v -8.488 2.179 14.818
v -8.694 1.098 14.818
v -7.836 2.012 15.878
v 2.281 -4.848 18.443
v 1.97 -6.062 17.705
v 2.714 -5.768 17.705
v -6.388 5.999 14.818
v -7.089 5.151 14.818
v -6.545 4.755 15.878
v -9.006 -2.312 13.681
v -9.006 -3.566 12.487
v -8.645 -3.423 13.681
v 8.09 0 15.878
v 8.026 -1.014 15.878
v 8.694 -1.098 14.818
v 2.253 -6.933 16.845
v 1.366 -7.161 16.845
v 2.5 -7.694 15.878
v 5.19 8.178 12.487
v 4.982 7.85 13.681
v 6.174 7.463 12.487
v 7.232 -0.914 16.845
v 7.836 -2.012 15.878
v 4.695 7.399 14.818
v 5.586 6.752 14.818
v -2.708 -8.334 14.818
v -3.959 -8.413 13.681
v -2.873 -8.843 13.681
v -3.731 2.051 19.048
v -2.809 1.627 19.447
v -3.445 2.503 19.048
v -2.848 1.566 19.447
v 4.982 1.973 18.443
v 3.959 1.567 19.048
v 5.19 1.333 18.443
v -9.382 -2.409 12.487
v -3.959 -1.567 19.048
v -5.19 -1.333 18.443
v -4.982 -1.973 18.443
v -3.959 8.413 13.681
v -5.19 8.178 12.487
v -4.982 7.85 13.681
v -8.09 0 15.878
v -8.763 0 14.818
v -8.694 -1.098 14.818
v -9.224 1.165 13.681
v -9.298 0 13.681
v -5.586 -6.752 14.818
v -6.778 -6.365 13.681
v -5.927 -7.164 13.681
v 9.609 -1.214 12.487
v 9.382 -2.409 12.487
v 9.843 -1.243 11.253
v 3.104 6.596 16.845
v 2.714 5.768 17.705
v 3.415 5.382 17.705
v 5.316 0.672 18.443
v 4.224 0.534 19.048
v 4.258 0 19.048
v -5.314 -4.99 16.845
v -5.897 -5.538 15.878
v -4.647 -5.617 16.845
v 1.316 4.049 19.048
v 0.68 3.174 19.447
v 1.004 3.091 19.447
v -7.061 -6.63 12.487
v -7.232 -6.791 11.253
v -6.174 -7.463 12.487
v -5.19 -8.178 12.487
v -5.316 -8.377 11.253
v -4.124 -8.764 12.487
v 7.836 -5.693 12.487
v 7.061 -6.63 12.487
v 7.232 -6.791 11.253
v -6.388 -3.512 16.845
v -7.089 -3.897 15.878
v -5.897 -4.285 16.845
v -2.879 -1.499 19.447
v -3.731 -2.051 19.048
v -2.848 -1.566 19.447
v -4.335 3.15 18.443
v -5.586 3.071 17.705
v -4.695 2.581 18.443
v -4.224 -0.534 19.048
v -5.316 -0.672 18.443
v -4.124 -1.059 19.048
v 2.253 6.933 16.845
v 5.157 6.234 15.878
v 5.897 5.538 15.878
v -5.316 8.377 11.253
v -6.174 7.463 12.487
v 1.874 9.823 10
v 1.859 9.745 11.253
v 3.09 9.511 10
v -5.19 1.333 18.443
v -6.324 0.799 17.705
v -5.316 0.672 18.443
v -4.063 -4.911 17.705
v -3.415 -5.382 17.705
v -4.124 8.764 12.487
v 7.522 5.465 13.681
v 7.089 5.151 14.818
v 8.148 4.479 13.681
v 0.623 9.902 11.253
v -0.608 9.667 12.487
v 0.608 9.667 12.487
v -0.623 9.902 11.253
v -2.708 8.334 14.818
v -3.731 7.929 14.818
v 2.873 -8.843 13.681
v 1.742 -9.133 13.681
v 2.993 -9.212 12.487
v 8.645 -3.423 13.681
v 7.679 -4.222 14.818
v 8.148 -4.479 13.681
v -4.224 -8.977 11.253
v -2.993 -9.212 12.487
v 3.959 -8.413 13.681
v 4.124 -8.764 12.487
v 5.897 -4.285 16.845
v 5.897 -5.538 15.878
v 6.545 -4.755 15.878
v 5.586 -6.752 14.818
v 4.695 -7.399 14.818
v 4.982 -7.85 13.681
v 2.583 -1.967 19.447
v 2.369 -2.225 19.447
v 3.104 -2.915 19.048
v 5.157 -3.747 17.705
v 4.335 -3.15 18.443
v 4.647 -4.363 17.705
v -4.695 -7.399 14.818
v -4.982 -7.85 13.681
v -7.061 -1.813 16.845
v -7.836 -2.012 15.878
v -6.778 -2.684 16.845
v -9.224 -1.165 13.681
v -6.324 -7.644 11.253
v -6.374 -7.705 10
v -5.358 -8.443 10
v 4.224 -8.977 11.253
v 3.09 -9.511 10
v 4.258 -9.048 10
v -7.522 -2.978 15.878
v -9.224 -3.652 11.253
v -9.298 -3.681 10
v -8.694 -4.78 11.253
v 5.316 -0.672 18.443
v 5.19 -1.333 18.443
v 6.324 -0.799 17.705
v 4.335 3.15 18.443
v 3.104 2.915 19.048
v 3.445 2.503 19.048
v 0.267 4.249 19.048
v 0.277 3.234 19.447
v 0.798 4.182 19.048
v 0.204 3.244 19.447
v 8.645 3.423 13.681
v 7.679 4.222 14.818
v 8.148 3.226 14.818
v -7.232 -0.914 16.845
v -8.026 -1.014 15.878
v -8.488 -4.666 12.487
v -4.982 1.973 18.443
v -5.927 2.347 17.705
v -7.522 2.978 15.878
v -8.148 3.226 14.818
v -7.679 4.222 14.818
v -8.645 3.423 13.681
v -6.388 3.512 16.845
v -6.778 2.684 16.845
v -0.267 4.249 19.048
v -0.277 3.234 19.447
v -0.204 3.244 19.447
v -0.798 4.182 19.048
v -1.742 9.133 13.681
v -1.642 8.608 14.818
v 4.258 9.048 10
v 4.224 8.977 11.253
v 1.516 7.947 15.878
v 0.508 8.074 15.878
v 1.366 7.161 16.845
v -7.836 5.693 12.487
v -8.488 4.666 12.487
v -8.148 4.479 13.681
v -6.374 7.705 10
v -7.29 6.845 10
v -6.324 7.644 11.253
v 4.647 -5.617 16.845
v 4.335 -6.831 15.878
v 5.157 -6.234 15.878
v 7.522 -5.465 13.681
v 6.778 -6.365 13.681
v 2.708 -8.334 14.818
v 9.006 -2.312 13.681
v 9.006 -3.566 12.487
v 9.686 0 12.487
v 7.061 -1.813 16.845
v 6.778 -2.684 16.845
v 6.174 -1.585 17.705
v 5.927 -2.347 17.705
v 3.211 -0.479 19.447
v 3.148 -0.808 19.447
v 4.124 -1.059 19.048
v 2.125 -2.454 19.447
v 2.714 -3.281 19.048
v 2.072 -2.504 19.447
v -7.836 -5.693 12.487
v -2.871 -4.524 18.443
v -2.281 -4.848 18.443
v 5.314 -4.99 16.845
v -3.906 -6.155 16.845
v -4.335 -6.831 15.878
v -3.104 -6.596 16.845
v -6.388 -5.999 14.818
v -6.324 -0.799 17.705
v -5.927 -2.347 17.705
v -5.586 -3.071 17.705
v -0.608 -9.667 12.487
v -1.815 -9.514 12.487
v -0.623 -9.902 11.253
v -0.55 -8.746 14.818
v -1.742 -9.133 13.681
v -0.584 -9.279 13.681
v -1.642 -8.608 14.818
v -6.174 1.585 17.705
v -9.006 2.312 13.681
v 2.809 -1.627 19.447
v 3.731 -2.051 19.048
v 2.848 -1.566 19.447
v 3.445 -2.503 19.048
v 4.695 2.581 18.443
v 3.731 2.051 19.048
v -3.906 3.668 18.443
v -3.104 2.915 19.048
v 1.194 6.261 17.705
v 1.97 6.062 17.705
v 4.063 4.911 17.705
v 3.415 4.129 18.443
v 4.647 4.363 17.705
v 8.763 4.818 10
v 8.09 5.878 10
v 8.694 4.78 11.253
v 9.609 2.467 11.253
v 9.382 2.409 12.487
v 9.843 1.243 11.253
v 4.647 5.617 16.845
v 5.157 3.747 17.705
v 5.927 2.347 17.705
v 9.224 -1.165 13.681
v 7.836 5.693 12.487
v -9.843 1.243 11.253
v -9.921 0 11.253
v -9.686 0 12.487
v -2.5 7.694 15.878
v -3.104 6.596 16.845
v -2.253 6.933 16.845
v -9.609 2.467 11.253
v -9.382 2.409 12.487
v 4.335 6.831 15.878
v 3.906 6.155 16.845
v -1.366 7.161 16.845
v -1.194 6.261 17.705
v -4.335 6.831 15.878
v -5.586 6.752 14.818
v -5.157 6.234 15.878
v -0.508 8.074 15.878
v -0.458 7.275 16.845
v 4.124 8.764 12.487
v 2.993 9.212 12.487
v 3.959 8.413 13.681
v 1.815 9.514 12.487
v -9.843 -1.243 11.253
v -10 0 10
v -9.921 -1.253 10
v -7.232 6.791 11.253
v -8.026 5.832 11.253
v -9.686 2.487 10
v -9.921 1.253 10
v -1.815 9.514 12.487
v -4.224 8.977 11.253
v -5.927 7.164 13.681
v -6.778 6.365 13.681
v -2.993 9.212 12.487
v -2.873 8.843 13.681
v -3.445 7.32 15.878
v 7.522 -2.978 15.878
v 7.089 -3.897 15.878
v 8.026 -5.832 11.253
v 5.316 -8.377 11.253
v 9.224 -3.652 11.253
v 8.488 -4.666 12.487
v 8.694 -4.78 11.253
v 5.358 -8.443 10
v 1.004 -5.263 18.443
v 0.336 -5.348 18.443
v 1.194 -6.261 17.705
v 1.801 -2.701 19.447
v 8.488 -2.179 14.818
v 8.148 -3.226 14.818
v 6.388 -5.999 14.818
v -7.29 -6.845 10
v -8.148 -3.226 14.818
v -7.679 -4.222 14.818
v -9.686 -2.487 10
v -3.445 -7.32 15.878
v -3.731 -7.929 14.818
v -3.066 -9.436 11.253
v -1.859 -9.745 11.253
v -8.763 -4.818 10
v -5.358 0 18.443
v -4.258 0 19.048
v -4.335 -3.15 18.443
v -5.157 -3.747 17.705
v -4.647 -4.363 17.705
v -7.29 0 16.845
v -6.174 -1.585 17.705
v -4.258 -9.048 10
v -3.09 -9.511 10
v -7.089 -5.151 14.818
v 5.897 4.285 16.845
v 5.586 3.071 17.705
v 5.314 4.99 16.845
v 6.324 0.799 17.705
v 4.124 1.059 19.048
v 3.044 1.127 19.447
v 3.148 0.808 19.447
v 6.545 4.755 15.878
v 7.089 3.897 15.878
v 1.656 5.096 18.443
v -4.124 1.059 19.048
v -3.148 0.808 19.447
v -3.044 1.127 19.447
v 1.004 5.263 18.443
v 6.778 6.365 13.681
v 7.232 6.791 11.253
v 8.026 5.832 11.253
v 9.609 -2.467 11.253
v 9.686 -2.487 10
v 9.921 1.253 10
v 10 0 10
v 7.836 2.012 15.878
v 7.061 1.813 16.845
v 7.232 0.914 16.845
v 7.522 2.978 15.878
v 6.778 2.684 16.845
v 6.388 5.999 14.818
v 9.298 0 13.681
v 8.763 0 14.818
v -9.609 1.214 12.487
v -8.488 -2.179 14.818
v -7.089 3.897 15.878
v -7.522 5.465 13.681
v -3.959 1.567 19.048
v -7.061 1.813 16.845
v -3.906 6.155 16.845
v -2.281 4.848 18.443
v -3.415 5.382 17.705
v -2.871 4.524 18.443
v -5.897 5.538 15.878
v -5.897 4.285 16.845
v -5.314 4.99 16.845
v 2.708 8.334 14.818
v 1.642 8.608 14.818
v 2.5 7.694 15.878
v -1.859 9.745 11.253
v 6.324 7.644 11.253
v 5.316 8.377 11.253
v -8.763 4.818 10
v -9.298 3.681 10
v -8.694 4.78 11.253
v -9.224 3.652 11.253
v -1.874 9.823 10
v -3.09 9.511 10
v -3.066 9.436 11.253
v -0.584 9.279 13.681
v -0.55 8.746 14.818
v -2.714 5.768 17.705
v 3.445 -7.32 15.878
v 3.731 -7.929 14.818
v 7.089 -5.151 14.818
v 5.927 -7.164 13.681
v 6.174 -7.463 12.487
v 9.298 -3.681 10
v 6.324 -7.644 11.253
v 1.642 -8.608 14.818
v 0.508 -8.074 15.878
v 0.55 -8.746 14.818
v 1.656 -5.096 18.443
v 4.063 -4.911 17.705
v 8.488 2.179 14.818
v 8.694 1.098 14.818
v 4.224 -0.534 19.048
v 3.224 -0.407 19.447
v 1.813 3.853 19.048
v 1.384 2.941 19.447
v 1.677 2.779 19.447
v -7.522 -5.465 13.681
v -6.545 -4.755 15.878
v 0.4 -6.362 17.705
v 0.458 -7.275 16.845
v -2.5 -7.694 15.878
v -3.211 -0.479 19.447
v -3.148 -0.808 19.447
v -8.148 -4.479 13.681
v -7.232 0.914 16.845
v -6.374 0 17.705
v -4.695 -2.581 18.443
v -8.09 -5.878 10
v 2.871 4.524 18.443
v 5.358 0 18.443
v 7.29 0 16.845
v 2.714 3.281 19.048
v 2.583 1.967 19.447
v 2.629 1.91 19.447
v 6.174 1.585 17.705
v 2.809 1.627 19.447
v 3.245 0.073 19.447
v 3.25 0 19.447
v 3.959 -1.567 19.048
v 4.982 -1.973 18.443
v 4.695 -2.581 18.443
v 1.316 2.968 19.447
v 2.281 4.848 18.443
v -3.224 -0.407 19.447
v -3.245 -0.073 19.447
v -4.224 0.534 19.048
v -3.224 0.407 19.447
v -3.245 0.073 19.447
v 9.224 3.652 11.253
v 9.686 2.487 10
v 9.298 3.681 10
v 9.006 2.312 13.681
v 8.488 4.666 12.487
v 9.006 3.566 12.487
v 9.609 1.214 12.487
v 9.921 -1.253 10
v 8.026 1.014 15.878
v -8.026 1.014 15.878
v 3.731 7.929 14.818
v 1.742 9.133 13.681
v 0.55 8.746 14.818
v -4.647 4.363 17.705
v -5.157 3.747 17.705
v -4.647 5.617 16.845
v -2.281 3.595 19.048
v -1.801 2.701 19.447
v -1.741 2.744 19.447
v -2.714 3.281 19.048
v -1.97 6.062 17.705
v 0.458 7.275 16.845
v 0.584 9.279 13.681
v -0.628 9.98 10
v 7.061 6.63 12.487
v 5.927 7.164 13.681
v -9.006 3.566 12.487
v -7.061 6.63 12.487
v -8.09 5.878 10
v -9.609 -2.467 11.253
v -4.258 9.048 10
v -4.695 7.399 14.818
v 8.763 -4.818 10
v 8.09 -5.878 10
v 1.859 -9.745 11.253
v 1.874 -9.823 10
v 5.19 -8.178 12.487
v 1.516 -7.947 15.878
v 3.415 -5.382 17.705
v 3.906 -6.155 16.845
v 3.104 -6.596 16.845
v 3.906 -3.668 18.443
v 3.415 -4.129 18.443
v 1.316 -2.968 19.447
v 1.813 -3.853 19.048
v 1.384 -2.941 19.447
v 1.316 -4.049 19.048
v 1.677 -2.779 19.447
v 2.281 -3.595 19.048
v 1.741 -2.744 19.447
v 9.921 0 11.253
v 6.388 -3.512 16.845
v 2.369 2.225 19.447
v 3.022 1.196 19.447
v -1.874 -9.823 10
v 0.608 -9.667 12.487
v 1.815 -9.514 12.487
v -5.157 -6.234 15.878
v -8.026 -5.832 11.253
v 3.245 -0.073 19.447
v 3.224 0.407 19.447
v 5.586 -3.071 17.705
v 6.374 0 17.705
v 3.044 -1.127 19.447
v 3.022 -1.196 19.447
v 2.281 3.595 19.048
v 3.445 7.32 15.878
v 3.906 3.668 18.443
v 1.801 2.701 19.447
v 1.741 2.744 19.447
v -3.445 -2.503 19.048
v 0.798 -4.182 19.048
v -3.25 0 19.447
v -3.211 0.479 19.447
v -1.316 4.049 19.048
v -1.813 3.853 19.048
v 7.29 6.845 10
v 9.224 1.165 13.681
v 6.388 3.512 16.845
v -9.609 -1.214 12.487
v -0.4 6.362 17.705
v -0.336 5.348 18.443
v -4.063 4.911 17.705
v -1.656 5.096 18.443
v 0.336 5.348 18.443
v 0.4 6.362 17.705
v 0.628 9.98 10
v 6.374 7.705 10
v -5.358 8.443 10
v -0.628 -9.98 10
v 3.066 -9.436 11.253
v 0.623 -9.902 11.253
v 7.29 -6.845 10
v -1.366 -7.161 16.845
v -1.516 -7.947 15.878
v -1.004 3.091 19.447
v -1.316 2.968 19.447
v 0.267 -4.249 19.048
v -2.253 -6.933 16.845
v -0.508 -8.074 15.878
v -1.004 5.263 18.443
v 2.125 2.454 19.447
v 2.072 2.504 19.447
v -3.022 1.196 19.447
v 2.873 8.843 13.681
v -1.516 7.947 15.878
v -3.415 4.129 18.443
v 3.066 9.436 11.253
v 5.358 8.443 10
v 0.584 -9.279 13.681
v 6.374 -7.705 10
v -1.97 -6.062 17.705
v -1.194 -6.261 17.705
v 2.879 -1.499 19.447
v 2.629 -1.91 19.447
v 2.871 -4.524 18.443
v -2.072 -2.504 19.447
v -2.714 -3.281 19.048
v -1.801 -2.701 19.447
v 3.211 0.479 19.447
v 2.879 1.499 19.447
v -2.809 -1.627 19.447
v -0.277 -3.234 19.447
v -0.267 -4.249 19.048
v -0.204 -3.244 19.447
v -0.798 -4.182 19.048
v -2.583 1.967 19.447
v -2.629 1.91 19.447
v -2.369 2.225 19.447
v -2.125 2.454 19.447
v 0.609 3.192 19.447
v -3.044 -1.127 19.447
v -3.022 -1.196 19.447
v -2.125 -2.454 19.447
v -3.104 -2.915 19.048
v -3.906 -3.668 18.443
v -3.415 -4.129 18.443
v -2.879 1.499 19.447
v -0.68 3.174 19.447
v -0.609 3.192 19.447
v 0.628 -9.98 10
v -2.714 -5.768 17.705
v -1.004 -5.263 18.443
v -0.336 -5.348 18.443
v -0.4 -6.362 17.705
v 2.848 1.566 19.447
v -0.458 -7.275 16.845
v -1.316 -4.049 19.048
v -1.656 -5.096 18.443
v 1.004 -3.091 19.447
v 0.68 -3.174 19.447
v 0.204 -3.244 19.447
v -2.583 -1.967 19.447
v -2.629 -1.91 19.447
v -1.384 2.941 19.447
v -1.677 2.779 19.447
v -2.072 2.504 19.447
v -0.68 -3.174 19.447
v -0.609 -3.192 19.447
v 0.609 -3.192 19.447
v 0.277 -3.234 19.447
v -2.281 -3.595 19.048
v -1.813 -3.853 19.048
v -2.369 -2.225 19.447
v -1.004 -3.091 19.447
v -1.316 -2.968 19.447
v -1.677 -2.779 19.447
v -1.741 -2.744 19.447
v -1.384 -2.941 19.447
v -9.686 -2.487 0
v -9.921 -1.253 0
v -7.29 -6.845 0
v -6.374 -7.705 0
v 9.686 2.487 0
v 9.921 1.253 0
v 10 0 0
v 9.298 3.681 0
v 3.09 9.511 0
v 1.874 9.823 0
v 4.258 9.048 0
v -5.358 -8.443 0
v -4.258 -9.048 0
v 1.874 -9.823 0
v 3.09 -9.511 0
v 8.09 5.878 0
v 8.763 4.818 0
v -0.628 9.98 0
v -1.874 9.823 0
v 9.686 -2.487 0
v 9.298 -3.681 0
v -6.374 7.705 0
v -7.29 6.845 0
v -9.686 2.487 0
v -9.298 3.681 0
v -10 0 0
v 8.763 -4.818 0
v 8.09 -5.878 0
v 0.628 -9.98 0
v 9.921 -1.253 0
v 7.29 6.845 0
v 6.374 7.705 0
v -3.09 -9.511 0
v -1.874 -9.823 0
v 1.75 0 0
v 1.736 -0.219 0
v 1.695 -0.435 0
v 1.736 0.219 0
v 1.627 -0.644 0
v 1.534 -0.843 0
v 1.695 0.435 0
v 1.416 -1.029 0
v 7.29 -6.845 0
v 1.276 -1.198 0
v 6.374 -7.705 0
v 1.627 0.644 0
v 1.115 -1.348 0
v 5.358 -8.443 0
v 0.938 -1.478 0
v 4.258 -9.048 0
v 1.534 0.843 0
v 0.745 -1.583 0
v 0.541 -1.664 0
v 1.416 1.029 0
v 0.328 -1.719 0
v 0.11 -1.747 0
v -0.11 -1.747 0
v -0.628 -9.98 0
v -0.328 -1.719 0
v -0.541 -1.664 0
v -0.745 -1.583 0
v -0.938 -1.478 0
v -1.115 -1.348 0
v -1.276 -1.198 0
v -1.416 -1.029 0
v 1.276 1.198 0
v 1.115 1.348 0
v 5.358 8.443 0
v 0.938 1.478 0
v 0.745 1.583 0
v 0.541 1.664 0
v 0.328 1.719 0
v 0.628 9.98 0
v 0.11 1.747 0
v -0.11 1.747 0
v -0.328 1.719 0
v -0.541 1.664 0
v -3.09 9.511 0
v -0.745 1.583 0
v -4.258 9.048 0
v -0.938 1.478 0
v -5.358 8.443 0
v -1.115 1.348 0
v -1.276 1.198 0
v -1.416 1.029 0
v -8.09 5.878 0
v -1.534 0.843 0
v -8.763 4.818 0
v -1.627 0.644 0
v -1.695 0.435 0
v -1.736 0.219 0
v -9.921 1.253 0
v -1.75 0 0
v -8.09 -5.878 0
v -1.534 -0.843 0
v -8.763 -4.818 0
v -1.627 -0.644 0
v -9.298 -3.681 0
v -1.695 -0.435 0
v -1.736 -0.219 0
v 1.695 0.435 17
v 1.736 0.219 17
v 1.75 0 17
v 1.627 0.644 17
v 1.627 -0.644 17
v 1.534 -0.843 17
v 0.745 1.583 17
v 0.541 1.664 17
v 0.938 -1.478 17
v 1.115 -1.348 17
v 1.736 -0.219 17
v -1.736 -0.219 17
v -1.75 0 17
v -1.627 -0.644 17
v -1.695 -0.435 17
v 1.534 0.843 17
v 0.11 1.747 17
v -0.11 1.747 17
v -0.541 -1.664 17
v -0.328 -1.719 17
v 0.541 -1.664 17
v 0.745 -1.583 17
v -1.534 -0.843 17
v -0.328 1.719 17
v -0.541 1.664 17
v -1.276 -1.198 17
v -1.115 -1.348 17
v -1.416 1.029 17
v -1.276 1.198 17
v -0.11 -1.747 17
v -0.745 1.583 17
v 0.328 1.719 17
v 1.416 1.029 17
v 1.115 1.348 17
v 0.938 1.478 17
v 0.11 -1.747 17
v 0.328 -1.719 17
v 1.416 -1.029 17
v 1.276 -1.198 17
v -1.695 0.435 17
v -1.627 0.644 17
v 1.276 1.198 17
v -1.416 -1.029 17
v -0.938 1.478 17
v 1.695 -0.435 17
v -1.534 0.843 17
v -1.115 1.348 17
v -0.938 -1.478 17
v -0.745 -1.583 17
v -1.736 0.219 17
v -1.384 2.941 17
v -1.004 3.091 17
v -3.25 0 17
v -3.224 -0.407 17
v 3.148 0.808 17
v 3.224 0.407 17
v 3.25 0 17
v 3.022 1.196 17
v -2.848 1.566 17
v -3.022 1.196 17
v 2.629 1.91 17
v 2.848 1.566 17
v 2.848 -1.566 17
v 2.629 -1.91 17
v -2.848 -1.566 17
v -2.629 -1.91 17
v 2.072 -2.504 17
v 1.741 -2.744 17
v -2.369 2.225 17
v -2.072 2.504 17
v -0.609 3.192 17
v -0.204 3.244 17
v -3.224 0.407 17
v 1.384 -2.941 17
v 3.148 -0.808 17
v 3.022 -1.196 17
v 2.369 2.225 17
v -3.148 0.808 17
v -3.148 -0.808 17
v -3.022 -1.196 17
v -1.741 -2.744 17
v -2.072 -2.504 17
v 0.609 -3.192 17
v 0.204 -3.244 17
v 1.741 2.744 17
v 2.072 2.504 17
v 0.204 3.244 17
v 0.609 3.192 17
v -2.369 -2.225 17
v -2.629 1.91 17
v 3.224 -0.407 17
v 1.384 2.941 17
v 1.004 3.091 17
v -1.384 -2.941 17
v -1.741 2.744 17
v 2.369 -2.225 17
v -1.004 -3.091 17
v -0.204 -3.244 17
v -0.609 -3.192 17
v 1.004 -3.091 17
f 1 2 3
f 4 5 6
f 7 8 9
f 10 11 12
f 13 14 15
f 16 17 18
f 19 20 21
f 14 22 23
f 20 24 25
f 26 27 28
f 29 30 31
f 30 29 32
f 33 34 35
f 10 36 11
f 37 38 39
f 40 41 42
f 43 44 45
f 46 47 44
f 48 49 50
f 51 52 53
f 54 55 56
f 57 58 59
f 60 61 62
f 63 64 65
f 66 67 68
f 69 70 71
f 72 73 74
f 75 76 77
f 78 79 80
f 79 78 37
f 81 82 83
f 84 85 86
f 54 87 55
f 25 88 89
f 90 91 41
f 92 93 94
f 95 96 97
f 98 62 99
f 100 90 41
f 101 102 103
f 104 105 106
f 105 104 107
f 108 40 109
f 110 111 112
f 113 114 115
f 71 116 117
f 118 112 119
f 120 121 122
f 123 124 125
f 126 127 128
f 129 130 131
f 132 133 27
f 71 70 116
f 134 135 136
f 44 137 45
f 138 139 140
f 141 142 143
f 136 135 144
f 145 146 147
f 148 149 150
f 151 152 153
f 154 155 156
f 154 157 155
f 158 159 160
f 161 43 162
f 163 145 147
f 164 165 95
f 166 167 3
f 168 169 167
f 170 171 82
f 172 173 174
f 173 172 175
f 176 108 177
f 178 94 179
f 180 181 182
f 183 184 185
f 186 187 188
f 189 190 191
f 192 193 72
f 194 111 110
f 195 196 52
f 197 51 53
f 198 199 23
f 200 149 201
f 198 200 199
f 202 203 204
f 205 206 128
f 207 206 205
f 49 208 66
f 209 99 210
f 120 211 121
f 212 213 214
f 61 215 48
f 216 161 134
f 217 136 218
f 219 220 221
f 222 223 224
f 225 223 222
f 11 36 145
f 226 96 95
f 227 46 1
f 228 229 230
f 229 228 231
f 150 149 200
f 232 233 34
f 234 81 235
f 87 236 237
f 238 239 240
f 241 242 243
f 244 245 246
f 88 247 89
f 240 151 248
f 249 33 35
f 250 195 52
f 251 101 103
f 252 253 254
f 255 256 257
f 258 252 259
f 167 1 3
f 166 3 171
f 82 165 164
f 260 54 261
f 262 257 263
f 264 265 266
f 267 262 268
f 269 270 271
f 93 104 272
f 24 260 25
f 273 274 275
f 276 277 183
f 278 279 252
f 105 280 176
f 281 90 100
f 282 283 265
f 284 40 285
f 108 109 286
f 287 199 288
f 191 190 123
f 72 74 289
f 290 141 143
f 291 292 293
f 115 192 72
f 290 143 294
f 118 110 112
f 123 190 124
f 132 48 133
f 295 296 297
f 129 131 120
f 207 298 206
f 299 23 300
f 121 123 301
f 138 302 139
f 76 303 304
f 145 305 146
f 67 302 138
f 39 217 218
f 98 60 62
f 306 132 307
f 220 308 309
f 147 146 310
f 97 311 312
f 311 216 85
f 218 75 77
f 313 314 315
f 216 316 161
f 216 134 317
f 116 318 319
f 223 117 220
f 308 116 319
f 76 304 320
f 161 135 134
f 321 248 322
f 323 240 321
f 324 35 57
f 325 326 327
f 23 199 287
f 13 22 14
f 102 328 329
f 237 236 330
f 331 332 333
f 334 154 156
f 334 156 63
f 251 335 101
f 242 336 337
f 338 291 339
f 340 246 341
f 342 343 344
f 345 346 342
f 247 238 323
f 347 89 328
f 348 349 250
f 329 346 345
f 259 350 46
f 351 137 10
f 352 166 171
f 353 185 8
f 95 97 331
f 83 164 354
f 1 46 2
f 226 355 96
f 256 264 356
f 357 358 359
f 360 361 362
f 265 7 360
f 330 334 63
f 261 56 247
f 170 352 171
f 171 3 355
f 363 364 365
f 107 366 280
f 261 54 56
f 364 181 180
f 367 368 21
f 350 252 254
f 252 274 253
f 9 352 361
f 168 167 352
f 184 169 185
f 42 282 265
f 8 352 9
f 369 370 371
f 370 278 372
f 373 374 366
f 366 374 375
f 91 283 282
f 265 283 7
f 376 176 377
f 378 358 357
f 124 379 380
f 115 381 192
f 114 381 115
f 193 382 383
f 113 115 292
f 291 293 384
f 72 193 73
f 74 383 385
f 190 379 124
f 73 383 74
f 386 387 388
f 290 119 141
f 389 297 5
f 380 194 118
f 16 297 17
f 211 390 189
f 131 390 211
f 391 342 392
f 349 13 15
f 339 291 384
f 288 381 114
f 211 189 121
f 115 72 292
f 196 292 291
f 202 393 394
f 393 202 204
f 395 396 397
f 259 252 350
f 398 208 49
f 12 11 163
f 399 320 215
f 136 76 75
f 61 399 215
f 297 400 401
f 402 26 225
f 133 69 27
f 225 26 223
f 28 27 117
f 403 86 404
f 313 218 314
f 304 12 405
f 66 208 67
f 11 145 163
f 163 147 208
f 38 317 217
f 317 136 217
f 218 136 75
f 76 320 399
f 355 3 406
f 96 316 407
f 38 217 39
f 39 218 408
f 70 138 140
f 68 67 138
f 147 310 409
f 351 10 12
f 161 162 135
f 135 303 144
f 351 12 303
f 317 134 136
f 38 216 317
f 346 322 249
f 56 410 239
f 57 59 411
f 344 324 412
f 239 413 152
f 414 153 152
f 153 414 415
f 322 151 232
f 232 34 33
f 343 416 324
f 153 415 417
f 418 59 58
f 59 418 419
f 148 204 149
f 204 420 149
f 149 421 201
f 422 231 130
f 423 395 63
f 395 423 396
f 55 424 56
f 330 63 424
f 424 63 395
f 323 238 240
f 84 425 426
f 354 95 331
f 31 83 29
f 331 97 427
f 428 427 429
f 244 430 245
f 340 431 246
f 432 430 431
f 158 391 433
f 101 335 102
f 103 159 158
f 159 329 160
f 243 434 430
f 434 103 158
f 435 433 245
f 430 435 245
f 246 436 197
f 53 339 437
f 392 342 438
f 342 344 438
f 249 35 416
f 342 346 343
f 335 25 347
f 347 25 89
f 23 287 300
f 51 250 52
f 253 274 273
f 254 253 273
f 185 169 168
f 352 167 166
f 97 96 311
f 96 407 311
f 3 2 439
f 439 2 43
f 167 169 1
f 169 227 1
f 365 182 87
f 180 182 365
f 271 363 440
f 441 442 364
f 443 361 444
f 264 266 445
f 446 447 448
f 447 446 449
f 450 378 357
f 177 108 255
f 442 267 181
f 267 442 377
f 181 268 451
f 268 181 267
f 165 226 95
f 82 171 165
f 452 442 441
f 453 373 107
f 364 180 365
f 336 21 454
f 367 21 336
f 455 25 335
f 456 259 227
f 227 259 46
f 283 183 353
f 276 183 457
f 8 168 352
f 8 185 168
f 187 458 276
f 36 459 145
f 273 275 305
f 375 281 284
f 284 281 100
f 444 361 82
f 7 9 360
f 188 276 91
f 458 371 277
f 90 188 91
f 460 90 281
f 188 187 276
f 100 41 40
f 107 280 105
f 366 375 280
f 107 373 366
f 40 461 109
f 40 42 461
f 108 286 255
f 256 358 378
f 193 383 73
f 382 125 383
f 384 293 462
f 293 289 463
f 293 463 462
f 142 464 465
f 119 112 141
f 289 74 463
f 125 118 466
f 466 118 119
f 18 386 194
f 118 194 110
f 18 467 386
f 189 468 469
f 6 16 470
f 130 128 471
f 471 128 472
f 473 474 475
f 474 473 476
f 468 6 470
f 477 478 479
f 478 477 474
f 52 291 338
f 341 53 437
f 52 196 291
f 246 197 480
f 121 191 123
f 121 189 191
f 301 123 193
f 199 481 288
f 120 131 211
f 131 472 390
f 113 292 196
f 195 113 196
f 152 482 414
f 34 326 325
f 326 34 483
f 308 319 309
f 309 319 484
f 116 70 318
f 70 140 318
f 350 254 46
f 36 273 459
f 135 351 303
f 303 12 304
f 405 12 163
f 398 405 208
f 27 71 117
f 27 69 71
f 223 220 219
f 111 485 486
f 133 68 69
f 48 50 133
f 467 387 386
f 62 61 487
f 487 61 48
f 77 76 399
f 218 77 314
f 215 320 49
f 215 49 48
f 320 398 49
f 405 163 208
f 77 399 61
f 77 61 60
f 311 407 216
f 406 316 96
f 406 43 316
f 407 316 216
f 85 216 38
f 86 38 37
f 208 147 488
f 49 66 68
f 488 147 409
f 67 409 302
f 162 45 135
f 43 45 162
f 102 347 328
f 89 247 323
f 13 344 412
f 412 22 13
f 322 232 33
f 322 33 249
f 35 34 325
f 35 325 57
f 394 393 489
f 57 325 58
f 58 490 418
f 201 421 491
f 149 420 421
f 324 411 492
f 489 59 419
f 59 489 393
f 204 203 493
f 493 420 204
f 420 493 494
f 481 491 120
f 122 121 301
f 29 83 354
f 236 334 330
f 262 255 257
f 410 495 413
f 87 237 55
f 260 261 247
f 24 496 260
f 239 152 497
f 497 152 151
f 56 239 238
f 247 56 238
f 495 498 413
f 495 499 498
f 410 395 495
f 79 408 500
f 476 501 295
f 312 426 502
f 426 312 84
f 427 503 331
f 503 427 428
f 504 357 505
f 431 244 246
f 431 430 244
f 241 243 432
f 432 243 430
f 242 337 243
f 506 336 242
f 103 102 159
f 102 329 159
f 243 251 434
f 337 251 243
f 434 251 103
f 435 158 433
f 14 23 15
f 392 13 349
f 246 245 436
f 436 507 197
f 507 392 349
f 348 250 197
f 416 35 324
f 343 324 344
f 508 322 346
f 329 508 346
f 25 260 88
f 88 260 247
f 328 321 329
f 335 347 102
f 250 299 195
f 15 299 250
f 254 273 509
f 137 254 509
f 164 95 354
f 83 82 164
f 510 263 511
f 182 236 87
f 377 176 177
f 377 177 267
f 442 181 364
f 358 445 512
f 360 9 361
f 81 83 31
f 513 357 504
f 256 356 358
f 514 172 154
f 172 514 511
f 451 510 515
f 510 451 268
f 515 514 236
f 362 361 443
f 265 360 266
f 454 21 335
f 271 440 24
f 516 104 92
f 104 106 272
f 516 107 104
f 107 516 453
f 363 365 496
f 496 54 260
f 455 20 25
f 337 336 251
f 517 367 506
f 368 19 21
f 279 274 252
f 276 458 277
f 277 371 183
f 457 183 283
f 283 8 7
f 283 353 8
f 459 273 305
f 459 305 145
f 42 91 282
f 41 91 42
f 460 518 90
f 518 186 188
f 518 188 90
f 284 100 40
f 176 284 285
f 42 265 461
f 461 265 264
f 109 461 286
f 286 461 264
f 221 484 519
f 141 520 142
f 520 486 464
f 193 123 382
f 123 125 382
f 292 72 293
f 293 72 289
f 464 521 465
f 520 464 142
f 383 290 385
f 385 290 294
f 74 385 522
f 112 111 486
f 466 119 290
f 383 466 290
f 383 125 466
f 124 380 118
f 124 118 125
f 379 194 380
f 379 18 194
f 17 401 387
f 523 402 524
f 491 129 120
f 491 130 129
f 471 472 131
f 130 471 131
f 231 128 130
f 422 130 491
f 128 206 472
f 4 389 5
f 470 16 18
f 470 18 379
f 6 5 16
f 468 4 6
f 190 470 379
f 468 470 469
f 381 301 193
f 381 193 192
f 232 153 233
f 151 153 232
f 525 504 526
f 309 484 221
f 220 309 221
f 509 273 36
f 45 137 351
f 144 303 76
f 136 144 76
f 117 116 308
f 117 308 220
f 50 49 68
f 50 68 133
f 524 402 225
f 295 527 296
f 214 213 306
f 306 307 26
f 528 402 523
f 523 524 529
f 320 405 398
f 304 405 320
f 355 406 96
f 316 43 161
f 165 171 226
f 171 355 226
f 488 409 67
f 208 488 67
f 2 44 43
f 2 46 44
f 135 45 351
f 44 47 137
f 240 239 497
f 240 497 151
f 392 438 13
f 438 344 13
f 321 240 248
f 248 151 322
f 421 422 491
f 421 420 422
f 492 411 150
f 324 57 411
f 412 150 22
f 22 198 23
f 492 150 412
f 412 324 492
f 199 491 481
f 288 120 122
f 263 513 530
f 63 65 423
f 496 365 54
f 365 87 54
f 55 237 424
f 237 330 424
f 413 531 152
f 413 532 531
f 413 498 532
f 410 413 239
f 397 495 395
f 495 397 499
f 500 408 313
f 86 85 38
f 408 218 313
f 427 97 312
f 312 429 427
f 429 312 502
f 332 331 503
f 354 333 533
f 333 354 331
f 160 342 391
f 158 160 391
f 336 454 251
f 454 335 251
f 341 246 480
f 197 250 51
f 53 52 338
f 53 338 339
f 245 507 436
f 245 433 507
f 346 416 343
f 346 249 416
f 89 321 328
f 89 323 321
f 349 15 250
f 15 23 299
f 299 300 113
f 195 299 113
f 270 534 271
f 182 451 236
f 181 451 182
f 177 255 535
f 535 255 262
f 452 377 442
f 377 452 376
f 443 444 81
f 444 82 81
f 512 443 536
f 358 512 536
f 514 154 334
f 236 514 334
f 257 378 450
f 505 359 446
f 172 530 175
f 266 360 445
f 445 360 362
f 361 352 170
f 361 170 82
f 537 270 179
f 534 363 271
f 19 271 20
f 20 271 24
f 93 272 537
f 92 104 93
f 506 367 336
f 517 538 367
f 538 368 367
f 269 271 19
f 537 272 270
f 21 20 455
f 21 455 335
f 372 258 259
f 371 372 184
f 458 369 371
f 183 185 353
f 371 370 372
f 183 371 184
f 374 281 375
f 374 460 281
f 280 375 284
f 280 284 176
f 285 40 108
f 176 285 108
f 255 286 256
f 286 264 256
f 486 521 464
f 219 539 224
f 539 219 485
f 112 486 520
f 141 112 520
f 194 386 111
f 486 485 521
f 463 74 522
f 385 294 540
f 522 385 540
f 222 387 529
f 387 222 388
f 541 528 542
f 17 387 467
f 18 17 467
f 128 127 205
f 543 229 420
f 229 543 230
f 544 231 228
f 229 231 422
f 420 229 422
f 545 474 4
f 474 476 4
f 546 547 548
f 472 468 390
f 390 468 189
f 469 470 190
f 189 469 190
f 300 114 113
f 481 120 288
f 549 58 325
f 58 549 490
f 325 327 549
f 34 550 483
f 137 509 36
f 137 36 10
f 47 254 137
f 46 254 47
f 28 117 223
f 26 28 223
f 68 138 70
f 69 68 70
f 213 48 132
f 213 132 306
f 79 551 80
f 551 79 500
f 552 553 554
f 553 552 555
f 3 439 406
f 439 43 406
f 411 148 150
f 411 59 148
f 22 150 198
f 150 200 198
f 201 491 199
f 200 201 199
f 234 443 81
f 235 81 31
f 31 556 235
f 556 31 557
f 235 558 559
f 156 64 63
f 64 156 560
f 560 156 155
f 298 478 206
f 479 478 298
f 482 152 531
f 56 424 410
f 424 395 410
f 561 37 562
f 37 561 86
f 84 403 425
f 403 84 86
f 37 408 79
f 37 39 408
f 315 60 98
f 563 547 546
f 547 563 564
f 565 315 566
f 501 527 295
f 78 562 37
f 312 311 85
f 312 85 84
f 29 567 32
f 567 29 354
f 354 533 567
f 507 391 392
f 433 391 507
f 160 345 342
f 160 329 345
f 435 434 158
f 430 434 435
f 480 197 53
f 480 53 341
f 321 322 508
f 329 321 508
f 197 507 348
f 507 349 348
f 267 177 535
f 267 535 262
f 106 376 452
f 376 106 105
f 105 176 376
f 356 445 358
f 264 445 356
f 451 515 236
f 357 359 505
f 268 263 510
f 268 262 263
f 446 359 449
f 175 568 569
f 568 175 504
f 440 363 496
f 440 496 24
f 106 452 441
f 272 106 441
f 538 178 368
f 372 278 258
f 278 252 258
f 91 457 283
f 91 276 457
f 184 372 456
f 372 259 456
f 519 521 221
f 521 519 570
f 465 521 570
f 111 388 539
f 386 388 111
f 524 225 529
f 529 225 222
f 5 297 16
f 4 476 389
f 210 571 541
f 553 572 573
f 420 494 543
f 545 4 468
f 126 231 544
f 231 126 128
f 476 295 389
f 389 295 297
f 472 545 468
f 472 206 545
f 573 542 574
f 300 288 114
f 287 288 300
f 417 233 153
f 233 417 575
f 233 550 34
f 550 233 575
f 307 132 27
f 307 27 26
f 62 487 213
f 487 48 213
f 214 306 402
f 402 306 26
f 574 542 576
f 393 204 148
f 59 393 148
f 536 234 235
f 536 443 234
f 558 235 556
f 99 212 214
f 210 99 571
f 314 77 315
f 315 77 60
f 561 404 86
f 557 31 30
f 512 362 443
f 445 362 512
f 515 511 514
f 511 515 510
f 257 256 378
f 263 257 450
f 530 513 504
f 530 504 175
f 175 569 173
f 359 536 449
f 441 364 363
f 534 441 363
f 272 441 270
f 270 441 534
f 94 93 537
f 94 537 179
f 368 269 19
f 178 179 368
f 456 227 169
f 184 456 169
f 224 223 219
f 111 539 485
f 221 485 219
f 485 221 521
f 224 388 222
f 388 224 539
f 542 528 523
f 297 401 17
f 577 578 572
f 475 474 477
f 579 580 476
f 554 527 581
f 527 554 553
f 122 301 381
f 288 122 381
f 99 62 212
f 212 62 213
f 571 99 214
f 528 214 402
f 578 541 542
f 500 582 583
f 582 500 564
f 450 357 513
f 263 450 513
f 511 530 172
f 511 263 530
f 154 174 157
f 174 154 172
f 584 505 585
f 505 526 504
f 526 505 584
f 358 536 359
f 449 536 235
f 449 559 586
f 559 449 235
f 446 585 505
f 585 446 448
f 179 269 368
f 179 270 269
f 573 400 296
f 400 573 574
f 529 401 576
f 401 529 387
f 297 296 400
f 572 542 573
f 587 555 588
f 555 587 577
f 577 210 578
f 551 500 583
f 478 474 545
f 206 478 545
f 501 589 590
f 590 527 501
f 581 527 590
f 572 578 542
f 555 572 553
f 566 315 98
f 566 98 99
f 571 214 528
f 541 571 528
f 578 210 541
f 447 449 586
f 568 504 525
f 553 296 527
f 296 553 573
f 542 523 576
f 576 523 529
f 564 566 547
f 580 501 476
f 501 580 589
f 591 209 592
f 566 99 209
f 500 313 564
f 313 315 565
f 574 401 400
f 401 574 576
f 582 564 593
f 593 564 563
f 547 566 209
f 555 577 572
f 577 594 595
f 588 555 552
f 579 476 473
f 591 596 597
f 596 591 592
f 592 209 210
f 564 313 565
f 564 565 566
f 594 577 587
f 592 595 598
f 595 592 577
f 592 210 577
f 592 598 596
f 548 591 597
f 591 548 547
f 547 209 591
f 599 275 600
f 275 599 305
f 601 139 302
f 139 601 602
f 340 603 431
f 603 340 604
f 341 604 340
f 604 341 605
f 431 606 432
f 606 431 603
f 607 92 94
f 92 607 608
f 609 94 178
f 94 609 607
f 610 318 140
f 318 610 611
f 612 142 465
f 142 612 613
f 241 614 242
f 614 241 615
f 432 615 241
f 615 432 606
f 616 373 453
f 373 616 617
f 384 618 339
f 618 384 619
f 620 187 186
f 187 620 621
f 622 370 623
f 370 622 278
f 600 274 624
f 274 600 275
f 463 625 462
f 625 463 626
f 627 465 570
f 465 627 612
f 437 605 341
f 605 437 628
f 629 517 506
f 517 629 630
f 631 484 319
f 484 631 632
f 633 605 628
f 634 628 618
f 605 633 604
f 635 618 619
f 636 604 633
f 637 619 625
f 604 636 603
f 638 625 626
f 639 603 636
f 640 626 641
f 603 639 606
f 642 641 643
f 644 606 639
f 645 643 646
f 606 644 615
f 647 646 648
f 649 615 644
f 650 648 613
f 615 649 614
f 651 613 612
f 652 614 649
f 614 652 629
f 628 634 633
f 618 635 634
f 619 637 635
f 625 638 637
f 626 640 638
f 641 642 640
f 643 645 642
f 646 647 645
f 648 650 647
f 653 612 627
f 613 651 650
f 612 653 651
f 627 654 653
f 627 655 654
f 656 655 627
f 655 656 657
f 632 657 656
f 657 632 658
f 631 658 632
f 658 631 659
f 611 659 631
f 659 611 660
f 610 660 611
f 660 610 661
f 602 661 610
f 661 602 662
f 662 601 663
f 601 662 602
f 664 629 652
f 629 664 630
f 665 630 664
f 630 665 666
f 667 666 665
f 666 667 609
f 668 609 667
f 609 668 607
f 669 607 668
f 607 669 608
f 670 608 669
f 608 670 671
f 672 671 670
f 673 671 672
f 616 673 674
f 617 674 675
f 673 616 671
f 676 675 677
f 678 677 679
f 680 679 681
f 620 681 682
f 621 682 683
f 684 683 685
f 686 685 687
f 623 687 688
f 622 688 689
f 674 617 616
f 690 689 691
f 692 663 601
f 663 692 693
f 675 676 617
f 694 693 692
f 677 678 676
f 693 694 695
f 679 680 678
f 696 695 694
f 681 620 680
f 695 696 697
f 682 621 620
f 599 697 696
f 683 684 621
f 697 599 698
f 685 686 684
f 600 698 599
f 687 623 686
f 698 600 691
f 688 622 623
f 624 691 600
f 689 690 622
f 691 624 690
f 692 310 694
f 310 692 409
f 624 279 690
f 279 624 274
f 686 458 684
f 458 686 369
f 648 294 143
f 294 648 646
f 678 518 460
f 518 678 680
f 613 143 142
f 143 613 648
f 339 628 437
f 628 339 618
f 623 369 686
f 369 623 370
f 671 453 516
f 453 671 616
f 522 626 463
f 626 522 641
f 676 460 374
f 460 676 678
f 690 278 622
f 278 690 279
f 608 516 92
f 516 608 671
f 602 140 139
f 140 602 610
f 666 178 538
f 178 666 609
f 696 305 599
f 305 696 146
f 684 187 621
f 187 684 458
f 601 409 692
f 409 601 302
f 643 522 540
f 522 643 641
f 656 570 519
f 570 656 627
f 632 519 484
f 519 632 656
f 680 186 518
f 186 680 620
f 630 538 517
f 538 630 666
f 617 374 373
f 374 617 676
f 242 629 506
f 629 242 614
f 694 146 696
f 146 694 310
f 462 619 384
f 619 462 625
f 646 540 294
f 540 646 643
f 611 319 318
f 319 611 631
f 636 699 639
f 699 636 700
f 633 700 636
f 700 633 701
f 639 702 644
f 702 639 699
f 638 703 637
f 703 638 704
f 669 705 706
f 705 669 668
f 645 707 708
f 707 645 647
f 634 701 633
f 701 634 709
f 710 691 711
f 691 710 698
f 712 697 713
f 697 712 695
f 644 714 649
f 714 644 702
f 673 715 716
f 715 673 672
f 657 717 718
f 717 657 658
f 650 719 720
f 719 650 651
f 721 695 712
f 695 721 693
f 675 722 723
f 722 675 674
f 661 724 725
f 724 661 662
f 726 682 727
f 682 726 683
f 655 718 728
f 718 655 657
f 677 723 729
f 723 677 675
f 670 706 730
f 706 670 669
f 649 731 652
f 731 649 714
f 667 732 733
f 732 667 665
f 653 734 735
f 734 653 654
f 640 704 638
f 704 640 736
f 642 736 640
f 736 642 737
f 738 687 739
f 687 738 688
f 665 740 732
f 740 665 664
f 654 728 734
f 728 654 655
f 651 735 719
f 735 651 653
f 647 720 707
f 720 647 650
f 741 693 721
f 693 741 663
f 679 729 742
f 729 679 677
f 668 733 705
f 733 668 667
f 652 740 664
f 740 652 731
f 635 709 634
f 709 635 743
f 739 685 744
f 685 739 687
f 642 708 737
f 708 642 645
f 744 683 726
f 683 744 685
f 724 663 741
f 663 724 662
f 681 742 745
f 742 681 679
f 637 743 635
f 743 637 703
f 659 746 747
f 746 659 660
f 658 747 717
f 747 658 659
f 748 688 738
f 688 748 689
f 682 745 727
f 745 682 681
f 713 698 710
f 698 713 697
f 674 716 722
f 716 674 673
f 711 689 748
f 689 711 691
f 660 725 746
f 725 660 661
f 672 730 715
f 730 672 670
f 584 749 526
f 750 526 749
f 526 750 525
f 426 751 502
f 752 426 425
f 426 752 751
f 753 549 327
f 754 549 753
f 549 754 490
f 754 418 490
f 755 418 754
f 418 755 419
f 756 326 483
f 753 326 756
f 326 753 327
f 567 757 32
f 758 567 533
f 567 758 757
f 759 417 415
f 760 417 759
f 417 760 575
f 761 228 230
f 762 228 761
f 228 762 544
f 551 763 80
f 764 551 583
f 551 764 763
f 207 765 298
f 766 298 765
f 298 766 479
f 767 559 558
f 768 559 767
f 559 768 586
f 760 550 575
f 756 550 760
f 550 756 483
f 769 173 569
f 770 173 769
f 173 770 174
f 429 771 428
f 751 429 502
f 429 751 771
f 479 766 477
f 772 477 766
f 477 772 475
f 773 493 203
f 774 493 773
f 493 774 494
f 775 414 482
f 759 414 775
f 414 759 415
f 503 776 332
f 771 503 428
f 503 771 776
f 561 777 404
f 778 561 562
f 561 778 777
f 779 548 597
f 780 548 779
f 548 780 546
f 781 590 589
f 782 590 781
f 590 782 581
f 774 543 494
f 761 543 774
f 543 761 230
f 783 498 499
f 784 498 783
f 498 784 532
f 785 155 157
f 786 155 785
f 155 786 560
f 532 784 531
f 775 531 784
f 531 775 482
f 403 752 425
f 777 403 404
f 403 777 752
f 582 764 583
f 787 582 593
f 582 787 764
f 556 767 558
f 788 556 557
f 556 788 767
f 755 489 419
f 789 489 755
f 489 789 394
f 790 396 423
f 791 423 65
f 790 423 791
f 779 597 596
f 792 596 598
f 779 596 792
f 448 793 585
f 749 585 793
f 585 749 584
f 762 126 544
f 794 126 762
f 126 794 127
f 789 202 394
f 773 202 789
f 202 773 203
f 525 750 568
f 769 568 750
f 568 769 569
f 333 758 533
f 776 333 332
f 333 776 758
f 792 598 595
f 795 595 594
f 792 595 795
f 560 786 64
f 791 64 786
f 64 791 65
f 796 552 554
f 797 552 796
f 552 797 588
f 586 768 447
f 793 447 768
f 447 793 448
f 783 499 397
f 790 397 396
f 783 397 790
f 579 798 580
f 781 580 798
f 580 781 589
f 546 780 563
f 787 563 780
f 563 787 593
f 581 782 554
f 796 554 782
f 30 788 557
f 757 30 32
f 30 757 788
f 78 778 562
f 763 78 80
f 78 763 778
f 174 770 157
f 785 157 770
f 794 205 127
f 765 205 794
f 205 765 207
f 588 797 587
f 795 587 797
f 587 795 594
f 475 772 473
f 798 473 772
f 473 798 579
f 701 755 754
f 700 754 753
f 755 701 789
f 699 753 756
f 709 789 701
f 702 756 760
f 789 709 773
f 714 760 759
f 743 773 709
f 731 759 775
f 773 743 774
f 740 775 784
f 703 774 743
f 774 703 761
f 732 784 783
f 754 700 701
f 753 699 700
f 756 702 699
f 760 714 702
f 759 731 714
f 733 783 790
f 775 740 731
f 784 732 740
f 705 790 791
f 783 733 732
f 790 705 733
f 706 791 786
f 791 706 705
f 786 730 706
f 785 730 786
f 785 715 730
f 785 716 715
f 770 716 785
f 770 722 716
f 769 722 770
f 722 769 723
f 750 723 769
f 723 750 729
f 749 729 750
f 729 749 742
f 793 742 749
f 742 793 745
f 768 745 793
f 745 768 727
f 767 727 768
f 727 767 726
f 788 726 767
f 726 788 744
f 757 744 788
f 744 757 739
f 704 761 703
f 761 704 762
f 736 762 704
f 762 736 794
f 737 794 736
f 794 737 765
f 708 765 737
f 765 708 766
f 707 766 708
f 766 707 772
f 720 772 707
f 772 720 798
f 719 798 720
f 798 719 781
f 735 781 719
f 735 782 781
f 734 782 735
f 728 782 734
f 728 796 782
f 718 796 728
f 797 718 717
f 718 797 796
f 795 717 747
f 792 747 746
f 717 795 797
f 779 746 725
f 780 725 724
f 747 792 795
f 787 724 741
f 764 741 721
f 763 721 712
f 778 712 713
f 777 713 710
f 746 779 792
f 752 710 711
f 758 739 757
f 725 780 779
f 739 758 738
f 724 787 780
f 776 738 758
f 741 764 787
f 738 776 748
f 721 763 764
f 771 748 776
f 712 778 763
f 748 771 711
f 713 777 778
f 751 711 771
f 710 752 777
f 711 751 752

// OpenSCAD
// Number of 'sides' in circles
// Amount of detail

$fn=50;

create_drone_skid(20,20,3.5,1,0);

// *********************
// Primatives drawing
// *********************

module create_prop_guard(){
    $height = 3;
    $hole_r = 8;

    ring($height,100,5);
    create_spokes(5,50,$height,15,3);
    create_round_plate_with_radial_holes($height,30,4,3,$hole_r);
}

module create_drone_skid(diameter,height,hole_d,num_holes,hole_radius){

    $angle_incr = 360/num_holes;
    $radius = diameter/2;


    difference(){
        union(){
            translate([0,0,height-$radius])
                sphere(d=diameter);
            cylinder(d=diameter,h=height-$radius);
        }
        for(angle=[0:$angle_incr:(num_holes-1)*$angle_incr]){
            rotate(a=angle,v=[0,0,1])
                translate([0,hole_radius,0]){    
                    translate([0,0,-1])
                        cylinder(h=height+10,d=hole_d);
                    translate([0,0,height-3])
                        cylinder(h=10,d=hole_d+3);
                }
        }
    }
}

module ring(height,diameter,thickness){
    
    difference(){
        cylinder(h=height,d=diameter);
        translate([0,0,-.5])
            cylinder(h=height+1,d=diameter-thickness);
    }
}

module create_spokes(num_spokes,width,height,center_offset,thickness){

    $angle_incr = 360/num_spokes;
    for(angle=[0:$angle_incr:(num_spokes-1)*$angle_incr]){    
    
        rotate(a=angle,v=[0,0,1])
            translate([-(thickness/2),center_offset,0])
                cube(size=[thickness,width-center_offset,height]);
            
    }
}

module create_round_plate_with_radial_holes(height,diameter,num_holes,hole_diameter,hole_offset){

    $angle_incr = 360/num_holes;
    
    difference(){
        cylinder(h=height,d=diameter);
    
        for(angle=[0:$angle_incr:(num_holes-1)*$angle_incr]){    
            rotate(a=angle,v=[0,0,1])
                translate([0,hole_offset,-1])
                    cylinder(h=10,d=hole_diameter); 
        }
    }
}
